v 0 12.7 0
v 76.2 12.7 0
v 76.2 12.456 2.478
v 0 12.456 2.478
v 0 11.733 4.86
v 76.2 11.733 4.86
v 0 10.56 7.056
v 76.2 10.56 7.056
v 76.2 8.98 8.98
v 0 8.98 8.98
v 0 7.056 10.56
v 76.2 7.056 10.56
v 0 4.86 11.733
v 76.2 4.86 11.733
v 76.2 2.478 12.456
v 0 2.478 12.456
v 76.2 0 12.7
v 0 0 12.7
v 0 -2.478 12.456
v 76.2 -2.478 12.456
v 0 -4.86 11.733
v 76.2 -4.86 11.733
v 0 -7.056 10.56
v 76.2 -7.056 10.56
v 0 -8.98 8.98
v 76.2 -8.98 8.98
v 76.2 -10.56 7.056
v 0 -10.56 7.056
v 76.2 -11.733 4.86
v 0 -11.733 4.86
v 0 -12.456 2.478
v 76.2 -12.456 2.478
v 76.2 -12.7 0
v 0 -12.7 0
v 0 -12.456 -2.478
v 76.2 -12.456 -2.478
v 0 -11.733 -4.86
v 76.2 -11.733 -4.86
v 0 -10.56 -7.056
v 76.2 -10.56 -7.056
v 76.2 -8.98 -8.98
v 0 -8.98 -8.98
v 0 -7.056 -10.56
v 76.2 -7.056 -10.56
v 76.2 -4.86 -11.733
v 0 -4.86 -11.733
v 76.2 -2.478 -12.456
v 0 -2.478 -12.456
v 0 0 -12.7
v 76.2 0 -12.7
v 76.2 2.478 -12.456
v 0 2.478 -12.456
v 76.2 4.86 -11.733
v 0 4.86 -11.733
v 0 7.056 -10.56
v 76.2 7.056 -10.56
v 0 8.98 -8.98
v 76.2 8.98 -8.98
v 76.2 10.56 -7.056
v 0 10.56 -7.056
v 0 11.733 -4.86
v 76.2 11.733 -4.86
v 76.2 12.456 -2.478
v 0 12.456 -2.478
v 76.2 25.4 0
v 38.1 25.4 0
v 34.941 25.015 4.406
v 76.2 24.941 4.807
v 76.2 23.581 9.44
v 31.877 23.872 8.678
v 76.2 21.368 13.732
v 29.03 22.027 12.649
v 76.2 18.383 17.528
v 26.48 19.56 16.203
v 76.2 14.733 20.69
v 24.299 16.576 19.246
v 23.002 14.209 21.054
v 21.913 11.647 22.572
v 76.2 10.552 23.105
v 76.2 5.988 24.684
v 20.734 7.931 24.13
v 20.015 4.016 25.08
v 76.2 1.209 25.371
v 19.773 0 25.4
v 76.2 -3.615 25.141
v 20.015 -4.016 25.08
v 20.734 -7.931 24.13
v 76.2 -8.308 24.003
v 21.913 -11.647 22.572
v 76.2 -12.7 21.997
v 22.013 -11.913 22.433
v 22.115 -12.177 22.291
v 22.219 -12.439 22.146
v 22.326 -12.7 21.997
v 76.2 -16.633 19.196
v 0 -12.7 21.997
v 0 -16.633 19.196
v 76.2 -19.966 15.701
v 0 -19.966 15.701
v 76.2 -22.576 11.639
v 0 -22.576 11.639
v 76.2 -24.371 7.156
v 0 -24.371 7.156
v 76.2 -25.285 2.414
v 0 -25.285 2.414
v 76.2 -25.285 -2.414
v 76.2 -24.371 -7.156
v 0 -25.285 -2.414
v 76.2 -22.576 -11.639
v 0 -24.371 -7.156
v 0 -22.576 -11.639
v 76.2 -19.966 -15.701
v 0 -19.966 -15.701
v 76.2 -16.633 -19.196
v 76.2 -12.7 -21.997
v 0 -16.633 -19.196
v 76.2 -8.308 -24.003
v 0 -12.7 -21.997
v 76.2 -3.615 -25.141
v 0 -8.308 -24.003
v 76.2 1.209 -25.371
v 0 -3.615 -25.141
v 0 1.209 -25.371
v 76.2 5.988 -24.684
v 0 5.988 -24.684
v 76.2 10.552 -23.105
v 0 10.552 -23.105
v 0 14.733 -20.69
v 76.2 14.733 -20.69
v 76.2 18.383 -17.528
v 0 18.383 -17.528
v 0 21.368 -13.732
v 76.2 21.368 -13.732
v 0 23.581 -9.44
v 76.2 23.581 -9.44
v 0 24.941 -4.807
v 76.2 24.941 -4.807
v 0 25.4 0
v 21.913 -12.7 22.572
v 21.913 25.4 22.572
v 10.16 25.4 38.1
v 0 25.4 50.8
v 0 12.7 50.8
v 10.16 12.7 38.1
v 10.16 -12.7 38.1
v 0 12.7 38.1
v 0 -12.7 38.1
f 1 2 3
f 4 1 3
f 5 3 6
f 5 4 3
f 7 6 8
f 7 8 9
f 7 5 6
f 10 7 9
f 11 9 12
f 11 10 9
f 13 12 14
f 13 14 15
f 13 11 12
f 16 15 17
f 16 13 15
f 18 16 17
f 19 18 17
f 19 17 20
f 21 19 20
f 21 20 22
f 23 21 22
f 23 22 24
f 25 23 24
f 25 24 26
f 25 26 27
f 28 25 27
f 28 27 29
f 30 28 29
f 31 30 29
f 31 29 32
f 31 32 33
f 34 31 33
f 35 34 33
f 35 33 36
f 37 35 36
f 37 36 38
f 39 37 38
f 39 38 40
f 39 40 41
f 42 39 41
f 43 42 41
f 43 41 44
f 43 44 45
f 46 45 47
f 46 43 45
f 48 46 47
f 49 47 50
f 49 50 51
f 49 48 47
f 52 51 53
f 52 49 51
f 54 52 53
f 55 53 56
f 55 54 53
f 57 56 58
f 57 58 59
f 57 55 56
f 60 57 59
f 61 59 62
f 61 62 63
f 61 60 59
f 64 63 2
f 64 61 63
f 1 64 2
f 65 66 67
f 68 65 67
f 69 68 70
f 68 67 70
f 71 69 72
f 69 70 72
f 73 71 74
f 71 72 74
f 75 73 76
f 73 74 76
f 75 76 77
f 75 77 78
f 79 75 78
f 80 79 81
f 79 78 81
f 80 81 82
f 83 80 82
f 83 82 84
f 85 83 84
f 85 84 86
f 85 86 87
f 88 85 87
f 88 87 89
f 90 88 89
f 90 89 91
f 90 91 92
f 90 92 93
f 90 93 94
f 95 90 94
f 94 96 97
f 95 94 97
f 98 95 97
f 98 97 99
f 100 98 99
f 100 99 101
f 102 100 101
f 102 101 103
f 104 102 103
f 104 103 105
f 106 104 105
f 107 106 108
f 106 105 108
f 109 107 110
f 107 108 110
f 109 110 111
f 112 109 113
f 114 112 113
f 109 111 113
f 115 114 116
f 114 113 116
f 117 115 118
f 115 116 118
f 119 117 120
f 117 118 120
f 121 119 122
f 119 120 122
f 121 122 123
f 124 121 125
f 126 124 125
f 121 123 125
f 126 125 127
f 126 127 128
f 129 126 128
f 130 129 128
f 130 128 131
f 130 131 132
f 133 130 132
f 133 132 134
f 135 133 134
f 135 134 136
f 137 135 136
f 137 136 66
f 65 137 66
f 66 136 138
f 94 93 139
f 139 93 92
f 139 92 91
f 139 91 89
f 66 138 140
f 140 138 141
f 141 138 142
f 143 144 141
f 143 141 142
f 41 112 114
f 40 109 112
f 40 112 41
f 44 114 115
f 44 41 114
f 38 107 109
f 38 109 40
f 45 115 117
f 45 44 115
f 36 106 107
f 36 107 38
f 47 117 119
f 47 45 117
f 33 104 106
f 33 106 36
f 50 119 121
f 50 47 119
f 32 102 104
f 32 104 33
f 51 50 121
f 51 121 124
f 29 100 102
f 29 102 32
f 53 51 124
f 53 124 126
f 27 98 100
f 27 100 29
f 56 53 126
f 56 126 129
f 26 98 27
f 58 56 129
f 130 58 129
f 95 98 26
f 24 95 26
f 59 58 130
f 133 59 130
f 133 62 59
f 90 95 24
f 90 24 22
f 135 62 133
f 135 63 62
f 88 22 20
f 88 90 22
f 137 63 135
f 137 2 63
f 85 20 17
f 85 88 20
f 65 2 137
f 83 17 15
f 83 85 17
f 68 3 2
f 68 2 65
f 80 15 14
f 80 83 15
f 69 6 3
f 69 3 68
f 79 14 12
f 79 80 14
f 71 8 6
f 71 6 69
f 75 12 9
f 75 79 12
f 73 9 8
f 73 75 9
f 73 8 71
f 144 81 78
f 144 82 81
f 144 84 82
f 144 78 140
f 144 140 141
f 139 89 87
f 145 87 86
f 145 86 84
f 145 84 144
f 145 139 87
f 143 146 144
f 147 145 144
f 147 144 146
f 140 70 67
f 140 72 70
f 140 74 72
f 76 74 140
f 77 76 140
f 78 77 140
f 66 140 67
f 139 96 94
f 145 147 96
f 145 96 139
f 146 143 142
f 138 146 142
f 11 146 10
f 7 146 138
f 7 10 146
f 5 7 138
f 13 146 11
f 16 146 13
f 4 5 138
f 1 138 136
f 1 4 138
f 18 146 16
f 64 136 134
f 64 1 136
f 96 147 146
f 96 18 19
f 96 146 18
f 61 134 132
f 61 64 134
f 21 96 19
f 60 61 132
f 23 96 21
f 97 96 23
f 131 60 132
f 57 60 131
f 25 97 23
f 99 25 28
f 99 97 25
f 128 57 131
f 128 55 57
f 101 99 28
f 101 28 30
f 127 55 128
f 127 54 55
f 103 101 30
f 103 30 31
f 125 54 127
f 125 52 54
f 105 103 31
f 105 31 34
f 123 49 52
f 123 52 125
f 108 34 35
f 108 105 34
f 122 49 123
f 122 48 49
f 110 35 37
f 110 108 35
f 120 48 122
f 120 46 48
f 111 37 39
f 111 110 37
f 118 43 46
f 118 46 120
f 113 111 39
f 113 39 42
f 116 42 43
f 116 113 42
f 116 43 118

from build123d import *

# Parameters (mm, degrees)
F0_R          = 25.4
F0_R_2        = 12.7
F1_DEPTH      = 76.2
F3_START      = -12.7
F3_DEPTH      = 12.7
F4_DEPTH      = 12.7
F4_DEPTH_BACK = 25.4
F5_DEPTH      = 12.7
F5_DEPTH_BACK = 25.4
F6_DEPTH      = 76.201


with BuildPart() as f1:
    # F0 (on Right) → F1 (new body)
    with BuildSketch(Plane.YZ):
        Circle(F0_R)
        Circle(F0_R_2, mode=Mode.SUBTRACT)
    extrude(amount=F1_DEPTH)



with BuildPart() as f3:
    # F2 (on Front) → F3 (new body)
    with BuildSketch(Plane.XZ.offset(F3_START)):
        Polygon((0, 50.8), (0, 38.1), (10.16, 38.1), align=None)
    extrude(amount=-F3_DEPTH)


with BuildPart() as f1_1:
    add(f1.part)

    add(f3.part)  # F4 merges F3
    # F2 (on Front) → F4 (join, two sides)
    with BuildSketch(Plane.XZ) as f4_sk:
        Polygon((0, 38.1), (0, 22.5723106414), (21.9132695347, 22.5723106414), (10.16, 38.1), align=None)
    extrude(amount=F4_DEPTH)
    extrude(f4_sk.sketch, amount=-F4_DEPTH_BACK)

    # F2 (on Front) → F5 (join, two sides)
    with BuildSketch(Plane.XZ) as f5_sk:
        Polygon((0, 22.5723106414), (0, 0), (38.1, 0), (21.9132695347, 22.5723106414), align=None)
    extrude(amount=F5_DEPTH)
    extrude(f5_sk.sketch, amount=-F5_DEPTH_BACK)

    # F0 (on Right) → F6 (cut, through all)
    with BuildSketch(Plane.YZ):
        Circle(F0_R_2)
    extrude(amount=F6_DEPTH, mode=Mode.SUBTRACT)


solid = f1_1.part
